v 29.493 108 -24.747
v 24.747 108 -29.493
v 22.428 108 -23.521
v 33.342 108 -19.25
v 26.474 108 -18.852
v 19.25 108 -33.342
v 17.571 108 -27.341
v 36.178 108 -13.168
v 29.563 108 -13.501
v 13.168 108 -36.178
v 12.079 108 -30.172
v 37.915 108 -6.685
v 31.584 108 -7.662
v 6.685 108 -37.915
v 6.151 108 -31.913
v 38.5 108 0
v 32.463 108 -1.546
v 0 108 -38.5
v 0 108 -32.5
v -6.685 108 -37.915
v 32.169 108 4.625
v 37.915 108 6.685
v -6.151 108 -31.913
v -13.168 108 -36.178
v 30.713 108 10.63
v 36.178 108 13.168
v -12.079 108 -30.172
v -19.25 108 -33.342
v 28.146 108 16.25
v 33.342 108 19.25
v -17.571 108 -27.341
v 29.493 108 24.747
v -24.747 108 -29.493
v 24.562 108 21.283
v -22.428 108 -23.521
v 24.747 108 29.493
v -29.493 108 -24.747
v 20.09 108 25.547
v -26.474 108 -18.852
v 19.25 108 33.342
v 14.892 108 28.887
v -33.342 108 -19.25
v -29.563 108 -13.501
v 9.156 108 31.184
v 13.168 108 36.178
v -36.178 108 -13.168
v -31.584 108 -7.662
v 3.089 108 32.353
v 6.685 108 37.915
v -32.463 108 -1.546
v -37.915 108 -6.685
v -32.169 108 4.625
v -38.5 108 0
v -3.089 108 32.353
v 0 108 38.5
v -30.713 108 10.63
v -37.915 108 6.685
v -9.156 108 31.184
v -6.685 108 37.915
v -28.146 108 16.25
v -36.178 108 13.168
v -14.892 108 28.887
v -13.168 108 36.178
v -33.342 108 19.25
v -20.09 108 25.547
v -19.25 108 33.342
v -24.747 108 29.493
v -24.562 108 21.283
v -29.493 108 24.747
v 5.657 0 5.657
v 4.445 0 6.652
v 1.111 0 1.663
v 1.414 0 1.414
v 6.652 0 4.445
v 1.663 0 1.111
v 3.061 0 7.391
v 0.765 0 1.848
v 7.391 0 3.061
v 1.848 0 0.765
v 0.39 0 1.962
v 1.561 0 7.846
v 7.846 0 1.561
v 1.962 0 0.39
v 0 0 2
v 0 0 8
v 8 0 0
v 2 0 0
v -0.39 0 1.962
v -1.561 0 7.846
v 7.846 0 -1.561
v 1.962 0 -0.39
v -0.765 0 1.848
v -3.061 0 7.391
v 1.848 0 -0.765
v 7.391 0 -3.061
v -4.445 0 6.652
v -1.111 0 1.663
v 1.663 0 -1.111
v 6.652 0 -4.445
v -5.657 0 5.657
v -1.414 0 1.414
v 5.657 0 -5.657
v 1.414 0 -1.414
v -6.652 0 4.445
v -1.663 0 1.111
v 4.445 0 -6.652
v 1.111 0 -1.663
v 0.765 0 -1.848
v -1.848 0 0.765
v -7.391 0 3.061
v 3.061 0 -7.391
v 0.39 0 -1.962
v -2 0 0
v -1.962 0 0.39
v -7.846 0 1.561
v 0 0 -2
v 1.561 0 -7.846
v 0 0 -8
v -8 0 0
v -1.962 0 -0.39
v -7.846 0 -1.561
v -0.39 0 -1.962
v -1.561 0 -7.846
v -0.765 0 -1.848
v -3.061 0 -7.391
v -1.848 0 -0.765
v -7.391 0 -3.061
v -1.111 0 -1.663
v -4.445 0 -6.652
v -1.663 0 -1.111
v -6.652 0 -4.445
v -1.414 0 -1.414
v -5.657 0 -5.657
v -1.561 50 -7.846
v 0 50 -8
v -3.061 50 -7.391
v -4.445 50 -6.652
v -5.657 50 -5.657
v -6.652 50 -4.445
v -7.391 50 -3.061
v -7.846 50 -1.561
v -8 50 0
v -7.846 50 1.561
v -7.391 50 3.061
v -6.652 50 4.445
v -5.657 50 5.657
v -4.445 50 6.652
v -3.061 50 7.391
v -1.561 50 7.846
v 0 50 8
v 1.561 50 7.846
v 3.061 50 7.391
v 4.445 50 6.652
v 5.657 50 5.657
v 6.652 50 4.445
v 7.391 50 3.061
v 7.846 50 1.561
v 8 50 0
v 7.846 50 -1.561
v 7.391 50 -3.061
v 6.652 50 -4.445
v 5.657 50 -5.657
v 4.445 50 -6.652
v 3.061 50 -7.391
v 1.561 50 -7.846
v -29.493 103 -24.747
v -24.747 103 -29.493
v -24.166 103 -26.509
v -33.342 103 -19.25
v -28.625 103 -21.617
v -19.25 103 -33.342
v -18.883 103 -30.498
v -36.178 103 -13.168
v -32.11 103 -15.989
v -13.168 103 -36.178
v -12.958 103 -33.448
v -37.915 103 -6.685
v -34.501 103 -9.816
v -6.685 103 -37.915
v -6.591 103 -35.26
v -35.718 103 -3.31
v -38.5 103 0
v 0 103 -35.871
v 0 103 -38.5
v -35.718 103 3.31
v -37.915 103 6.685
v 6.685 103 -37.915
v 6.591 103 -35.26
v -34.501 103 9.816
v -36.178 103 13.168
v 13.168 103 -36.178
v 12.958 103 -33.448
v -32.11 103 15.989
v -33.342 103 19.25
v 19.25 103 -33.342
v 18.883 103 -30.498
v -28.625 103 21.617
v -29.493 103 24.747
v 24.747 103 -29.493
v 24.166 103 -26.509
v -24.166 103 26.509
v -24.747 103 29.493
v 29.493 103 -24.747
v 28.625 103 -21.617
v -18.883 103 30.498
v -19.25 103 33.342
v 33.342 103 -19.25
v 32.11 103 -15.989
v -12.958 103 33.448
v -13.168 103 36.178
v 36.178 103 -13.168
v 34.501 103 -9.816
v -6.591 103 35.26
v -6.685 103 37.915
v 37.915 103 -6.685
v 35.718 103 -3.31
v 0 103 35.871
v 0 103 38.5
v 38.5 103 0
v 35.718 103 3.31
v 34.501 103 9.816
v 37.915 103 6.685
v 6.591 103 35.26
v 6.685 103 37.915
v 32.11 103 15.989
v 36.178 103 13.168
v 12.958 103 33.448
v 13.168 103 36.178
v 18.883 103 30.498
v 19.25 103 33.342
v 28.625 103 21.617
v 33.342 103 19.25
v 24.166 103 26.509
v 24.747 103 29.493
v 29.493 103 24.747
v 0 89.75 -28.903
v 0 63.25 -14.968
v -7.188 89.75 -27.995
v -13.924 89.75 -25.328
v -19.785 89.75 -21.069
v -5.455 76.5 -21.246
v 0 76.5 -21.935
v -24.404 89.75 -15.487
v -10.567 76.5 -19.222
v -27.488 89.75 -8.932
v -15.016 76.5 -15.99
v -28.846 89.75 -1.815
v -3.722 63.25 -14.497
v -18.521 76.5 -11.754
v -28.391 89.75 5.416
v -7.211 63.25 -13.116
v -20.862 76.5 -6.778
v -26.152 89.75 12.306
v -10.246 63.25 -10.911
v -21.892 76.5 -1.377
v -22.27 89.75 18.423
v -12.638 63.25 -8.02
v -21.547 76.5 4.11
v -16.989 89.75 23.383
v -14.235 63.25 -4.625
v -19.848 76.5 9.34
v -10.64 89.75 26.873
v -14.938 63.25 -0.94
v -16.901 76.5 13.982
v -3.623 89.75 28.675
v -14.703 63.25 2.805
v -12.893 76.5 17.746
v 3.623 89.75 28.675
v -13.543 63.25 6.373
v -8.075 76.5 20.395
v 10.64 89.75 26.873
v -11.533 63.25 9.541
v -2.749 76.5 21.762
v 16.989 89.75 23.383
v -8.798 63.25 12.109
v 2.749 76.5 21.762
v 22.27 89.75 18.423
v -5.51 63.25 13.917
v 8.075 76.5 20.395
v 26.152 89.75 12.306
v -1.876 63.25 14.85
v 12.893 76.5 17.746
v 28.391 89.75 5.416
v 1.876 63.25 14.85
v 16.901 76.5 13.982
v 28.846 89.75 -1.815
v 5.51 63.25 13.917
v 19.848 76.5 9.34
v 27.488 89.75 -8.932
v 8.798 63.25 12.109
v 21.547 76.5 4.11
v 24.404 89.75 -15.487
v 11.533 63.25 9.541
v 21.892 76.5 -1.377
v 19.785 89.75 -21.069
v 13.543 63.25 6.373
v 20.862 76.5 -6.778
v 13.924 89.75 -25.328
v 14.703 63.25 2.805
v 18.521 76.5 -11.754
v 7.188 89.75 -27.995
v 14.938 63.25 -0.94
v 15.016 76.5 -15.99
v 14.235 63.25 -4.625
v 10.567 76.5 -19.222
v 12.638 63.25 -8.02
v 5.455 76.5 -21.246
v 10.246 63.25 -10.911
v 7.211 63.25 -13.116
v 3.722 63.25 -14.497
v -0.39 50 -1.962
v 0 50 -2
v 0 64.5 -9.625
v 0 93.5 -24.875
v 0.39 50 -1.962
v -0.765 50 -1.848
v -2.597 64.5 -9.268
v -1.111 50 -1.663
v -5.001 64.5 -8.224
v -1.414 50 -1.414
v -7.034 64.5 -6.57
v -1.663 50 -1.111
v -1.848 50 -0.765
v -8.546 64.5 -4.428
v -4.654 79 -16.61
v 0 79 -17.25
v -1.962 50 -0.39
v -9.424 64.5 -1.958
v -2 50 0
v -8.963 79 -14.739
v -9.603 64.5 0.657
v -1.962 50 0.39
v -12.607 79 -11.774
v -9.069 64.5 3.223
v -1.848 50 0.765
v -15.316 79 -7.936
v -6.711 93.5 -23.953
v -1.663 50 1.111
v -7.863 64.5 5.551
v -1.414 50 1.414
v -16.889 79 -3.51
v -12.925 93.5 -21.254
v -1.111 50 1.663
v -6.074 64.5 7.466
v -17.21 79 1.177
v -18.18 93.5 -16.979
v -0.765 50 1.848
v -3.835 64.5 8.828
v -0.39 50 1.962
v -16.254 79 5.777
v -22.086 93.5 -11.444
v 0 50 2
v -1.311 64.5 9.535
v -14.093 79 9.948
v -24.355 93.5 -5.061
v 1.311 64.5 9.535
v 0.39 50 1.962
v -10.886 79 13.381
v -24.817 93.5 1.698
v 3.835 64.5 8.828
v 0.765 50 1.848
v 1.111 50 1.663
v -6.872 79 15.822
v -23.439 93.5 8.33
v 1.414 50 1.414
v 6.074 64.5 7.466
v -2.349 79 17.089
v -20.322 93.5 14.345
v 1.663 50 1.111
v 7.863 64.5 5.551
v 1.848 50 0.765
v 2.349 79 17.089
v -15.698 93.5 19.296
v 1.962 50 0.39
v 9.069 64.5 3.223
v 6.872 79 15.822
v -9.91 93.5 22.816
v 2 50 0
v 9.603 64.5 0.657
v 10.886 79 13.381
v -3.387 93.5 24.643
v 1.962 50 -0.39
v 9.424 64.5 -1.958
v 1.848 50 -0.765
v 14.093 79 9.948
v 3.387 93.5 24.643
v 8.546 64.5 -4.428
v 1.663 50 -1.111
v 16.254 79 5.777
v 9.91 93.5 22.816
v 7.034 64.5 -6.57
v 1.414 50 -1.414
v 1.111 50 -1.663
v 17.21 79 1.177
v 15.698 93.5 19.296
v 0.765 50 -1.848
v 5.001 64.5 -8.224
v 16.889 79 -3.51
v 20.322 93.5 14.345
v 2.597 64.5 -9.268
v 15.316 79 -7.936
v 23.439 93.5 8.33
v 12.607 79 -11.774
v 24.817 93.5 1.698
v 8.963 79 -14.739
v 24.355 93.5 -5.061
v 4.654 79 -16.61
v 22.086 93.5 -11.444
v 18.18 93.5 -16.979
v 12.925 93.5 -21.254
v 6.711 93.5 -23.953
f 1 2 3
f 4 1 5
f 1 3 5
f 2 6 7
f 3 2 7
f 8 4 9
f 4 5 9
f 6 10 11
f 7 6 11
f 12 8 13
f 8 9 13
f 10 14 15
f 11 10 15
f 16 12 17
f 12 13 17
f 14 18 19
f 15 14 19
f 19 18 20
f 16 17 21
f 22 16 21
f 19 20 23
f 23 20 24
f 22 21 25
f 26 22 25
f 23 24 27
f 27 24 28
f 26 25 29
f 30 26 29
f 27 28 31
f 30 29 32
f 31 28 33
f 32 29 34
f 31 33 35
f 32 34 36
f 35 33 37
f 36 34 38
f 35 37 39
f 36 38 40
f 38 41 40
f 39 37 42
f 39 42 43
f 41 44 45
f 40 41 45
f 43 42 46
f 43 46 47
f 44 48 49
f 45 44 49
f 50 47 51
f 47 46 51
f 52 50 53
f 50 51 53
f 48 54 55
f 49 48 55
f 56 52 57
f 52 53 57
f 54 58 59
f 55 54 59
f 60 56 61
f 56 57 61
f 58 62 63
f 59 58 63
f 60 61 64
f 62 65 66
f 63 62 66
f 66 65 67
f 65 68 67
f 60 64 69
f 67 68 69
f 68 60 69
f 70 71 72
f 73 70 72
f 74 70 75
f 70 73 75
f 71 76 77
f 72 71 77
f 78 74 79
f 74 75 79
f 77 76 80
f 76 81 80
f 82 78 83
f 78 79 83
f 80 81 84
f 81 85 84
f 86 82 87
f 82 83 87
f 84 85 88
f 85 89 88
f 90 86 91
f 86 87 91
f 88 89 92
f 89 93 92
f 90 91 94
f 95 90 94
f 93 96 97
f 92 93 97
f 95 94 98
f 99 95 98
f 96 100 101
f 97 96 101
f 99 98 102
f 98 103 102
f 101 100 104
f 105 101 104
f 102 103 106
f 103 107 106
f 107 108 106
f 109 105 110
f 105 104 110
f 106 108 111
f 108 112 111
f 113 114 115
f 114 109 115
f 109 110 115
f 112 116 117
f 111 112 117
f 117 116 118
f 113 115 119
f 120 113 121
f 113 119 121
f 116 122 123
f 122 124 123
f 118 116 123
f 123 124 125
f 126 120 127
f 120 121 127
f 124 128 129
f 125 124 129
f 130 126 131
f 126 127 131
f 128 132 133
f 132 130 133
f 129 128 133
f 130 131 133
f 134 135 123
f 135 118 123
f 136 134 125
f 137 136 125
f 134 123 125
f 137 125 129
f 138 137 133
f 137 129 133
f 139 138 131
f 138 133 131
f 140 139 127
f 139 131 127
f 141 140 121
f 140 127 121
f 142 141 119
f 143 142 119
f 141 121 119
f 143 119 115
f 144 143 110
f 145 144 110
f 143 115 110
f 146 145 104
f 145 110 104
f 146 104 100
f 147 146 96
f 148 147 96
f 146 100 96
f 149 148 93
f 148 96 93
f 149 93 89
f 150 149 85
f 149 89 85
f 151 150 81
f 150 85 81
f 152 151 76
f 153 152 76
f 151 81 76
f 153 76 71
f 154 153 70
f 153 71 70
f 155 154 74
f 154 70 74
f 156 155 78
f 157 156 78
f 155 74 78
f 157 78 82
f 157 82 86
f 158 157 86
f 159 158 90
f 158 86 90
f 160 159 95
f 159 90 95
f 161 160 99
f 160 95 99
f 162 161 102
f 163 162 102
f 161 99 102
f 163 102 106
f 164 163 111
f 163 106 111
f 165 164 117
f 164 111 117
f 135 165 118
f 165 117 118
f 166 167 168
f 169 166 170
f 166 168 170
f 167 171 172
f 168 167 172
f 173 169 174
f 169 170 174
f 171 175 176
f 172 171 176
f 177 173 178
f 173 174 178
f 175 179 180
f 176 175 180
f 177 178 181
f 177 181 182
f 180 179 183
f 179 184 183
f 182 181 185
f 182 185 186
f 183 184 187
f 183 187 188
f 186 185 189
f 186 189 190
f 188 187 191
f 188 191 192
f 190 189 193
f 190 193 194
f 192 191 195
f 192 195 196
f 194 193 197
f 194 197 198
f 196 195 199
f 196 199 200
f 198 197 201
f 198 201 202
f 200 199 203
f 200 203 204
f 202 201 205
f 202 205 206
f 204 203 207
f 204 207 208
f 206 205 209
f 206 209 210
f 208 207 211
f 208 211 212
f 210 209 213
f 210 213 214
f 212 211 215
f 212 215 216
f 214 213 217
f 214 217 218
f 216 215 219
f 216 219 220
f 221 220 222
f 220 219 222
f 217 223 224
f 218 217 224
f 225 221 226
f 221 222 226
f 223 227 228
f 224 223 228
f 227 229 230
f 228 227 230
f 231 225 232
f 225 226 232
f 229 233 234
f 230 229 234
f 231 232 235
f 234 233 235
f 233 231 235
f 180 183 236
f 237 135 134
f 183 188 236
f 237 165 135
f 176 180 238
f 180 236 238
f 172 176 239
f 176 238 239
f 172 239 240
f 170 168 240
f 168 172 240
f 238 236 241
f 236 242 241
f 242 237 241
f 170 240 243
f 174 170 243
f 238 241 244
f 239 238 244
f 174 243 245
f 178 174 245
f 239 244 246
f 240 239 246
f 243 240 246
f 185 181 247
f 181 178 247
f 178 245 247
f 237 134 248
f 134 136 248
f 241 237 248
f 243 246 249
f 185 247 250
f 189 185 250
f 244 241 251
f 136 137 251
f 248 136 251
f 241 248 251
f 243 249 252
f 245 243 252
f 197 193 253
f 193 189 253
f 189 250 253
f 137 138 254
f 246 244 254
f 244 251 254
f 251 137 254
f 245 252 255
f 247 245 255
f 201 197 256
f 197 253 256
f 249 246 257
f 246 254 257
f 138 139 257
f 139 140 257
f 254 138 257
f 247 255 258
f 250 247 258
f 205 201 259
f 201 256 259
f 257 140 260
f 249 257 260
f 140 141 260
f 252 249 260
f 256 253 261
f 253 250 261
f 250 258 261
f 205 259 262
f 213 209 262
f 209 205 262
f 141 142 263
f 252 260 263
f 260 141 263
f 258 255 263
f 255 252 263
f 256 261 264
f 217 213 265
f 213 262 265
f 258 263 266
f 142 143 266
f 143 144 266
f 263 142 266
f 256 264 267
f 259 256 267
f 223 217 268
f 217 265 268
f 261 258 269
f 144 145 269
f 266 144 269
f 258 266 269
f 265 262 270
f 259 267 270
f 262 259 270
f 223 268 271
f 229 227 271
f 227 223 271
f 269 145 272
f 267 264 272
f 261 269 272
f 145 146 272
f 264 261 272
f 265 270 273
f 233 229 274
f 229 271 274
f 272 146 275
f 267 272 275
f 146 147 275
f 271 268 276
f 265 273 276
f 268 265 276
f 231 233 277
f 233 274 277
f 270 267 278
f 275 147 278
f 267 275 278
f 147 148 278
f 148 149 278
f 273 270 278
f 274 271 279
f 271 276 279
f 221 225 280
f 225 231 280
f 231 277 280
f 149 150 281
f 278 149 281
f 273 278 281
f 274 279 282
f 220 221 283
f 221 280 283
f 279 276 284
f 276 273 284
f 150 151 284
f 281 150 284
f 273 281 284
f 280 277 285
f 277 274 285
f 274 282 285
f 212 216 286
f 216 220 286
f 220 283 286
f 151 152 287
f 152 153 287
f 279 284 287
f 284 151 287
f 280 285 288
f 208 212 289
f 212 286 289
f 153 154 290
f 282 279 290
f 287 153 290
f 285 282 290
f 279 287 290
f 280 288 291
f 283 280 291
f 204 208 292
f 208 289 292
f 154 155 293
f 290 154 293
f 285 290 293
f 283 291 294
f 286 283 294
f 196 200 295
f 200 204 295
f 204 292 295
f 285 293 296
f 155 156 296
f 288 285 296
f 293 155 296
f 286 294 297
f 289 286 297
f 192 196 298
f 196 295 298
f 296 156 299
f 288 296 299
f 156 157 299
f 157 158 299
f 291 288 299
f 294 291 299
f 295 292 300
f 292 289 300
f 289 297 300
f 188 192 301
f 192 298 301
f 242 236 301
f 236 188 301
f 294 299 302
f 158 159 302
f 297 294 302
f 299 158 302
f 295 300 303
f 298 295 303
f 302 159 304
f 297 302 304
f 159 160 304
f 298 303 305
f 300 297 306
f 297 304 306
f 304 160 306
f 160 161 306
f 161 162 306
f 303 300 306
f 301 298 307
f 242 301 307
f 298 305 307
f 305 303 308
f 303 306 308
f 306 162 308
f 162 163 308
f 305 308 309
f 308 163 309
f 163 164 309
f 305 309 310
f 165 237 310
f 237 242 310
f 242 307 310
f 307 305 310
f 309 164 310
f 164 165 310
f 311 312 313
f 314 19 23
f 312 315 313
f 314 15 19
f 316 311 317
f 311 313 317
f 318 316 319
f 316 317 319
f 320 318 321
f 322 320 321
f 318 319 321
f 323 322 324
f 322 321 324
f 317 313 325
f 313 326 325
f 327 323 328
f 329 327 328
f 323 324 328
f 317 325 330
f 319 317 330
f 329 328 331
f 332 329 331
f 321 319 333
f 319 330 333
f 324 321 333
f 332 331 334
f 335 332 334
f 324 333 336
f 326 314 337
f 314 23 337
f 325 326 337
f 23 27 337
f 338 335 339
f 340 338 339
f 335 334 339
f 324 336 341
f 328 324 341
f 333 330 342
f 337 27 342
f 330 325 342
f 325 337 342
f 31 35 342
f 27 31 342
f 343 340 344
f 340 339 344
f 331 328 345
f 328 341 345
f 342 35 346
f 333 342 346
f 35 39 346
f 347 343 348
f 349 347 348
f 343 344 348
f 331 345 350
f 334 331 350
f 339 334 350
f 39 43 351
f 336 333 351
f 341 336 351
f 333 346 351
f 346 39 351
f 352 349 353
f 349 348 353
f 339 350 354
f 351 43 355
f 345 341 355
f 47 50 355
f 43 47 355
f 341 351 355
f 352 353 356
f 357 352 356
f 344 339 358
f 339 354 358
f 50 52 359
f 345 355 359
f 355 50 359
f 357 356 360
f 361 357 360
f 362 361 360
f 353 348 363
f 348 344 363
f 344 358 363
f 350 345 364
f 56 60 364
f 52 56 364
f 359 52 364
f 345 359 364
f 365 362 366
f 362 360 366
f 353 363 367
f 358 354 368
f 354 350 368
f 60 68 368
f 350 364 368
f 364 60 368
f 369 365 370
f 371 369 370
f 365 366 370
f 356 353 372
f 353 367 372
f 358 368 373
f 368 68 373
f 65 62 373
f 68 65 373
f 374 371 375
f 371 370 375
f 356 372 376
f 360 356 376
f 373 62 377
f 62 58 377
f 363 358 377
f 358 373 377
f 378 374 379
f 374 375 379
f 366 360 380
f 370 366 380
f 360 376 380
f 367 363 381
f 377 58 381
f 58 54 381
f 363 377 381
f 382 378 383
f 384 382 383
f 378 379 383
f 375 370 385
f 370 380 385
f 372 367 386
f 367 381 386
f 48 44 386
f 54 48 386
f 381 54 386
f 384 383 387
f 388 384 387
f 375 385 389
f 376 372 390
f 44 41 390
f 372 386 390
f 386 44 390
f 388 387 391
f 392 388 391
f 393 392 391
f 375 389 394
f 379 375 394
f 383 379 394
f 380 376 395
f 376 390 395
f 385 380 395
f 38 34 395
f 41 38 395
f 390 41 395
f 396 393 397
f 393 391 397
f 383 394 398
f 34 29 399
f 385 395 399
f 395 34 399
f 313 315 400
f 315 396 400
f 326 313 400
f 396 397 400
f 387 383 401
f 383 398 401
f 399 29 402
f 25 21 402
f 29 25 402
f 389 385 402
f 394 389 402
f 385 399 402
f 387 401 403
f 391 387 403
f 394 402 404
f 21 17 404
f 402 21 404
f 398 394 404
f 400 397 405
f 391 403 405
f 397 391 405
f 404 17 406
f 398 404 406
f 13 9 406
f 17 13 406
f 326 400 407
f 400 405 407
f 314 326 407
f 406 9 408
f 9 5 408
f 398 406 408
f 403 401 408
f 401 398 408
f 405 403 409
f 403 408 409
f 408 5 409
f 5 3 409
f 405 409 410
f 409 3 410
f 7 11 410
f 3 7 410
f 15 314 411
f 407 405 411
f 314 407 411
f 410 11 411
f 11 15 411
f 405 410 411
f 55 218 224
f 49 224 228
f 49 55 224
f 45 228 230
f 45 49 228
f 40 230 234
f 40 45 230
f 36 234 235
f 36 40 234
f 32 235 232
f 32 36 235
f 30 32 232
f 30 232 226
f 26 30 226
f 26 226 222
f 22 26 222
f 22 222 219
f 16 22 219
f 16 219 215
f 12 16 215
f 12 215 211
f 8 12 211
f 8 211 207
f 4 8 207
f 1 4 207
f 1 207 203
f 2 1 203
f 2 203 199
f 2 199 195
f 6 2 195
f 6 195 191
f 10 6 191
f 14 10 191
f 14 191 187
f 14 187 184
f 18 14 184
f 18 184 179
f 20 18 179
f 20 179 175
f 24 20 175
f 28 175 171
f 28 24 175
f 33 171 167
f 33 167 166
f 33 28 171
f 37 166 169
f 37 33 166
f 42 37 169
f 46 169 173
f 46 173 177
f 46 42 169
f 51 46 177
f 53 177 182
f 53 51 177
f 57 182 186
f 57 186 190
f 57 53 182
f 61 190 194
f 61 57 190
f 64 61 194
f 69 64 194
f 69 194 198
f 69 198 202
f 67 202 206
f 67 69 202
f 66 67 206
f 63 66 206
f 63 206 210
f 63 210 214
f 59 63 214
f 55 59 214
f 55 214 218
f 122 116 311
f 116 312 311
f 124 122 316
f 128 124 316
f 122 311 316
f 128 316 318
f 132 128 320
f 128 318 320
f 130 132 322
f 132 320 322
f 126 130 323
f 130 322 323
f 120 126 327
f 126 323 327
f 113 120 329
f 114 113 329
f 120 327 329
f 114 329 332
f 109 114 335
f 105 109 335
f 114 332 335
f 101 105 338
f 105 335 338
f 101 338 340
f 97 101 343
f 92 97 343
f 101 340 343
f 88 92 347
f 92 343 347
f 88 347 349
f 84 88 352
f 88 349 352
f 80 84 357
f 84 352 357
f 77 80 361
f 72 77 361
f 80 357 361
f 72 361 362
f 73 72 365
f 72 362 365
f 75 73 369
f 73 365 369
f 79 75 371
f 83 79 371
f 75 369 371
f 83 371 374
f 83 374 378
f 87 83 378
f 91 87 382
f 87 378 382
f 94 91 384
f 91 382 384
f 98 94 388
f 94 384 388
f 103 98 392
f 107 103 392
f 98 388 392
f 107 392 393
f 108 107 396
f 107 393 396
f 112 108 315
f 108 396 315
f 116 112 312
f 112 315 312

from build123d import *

# Parameters (mm, degrees)
SKETCH2_R           = 38.5
SKETCH2_R_2         = 32.5
BOSS_EXTRUDE1_DEPTH = 5


with BuildPart() as part:
    # Sketch1 → Revolve1 (revolve)
    with BuildSketch(Plane.XY, mode=Mode.PRIVATE) as revolve1_sk:
        Polygon((2, 0), (2, 50), (32.5, 108), (38.5, 108), (8, 50), (8, 0), align=None)
    revolve(revolve1_sk.sketch.rotate(Axis((0, 0, 0), (0, 1, 0)), 90), axis=Axis((0, 0, 0), (0, 1, 0)))

    # Sketch2 → Boss-Extrude1 (add)
    with BuildSketch(Plane(origin=(0, 108, 0), x_dir=(1, 0, 0), z_dir=(0, 1, 0))):
        with Locations(Location((0, 0, 0), (0, 0, 270))):
            Circle(SKETCH2_R)
        Circle(SKETCH2_R_2, mode=Mode.SUBTRACT)
    extrude(amount=-BOSS_EXTRUDE1_DEPTH)


solid = part.part
